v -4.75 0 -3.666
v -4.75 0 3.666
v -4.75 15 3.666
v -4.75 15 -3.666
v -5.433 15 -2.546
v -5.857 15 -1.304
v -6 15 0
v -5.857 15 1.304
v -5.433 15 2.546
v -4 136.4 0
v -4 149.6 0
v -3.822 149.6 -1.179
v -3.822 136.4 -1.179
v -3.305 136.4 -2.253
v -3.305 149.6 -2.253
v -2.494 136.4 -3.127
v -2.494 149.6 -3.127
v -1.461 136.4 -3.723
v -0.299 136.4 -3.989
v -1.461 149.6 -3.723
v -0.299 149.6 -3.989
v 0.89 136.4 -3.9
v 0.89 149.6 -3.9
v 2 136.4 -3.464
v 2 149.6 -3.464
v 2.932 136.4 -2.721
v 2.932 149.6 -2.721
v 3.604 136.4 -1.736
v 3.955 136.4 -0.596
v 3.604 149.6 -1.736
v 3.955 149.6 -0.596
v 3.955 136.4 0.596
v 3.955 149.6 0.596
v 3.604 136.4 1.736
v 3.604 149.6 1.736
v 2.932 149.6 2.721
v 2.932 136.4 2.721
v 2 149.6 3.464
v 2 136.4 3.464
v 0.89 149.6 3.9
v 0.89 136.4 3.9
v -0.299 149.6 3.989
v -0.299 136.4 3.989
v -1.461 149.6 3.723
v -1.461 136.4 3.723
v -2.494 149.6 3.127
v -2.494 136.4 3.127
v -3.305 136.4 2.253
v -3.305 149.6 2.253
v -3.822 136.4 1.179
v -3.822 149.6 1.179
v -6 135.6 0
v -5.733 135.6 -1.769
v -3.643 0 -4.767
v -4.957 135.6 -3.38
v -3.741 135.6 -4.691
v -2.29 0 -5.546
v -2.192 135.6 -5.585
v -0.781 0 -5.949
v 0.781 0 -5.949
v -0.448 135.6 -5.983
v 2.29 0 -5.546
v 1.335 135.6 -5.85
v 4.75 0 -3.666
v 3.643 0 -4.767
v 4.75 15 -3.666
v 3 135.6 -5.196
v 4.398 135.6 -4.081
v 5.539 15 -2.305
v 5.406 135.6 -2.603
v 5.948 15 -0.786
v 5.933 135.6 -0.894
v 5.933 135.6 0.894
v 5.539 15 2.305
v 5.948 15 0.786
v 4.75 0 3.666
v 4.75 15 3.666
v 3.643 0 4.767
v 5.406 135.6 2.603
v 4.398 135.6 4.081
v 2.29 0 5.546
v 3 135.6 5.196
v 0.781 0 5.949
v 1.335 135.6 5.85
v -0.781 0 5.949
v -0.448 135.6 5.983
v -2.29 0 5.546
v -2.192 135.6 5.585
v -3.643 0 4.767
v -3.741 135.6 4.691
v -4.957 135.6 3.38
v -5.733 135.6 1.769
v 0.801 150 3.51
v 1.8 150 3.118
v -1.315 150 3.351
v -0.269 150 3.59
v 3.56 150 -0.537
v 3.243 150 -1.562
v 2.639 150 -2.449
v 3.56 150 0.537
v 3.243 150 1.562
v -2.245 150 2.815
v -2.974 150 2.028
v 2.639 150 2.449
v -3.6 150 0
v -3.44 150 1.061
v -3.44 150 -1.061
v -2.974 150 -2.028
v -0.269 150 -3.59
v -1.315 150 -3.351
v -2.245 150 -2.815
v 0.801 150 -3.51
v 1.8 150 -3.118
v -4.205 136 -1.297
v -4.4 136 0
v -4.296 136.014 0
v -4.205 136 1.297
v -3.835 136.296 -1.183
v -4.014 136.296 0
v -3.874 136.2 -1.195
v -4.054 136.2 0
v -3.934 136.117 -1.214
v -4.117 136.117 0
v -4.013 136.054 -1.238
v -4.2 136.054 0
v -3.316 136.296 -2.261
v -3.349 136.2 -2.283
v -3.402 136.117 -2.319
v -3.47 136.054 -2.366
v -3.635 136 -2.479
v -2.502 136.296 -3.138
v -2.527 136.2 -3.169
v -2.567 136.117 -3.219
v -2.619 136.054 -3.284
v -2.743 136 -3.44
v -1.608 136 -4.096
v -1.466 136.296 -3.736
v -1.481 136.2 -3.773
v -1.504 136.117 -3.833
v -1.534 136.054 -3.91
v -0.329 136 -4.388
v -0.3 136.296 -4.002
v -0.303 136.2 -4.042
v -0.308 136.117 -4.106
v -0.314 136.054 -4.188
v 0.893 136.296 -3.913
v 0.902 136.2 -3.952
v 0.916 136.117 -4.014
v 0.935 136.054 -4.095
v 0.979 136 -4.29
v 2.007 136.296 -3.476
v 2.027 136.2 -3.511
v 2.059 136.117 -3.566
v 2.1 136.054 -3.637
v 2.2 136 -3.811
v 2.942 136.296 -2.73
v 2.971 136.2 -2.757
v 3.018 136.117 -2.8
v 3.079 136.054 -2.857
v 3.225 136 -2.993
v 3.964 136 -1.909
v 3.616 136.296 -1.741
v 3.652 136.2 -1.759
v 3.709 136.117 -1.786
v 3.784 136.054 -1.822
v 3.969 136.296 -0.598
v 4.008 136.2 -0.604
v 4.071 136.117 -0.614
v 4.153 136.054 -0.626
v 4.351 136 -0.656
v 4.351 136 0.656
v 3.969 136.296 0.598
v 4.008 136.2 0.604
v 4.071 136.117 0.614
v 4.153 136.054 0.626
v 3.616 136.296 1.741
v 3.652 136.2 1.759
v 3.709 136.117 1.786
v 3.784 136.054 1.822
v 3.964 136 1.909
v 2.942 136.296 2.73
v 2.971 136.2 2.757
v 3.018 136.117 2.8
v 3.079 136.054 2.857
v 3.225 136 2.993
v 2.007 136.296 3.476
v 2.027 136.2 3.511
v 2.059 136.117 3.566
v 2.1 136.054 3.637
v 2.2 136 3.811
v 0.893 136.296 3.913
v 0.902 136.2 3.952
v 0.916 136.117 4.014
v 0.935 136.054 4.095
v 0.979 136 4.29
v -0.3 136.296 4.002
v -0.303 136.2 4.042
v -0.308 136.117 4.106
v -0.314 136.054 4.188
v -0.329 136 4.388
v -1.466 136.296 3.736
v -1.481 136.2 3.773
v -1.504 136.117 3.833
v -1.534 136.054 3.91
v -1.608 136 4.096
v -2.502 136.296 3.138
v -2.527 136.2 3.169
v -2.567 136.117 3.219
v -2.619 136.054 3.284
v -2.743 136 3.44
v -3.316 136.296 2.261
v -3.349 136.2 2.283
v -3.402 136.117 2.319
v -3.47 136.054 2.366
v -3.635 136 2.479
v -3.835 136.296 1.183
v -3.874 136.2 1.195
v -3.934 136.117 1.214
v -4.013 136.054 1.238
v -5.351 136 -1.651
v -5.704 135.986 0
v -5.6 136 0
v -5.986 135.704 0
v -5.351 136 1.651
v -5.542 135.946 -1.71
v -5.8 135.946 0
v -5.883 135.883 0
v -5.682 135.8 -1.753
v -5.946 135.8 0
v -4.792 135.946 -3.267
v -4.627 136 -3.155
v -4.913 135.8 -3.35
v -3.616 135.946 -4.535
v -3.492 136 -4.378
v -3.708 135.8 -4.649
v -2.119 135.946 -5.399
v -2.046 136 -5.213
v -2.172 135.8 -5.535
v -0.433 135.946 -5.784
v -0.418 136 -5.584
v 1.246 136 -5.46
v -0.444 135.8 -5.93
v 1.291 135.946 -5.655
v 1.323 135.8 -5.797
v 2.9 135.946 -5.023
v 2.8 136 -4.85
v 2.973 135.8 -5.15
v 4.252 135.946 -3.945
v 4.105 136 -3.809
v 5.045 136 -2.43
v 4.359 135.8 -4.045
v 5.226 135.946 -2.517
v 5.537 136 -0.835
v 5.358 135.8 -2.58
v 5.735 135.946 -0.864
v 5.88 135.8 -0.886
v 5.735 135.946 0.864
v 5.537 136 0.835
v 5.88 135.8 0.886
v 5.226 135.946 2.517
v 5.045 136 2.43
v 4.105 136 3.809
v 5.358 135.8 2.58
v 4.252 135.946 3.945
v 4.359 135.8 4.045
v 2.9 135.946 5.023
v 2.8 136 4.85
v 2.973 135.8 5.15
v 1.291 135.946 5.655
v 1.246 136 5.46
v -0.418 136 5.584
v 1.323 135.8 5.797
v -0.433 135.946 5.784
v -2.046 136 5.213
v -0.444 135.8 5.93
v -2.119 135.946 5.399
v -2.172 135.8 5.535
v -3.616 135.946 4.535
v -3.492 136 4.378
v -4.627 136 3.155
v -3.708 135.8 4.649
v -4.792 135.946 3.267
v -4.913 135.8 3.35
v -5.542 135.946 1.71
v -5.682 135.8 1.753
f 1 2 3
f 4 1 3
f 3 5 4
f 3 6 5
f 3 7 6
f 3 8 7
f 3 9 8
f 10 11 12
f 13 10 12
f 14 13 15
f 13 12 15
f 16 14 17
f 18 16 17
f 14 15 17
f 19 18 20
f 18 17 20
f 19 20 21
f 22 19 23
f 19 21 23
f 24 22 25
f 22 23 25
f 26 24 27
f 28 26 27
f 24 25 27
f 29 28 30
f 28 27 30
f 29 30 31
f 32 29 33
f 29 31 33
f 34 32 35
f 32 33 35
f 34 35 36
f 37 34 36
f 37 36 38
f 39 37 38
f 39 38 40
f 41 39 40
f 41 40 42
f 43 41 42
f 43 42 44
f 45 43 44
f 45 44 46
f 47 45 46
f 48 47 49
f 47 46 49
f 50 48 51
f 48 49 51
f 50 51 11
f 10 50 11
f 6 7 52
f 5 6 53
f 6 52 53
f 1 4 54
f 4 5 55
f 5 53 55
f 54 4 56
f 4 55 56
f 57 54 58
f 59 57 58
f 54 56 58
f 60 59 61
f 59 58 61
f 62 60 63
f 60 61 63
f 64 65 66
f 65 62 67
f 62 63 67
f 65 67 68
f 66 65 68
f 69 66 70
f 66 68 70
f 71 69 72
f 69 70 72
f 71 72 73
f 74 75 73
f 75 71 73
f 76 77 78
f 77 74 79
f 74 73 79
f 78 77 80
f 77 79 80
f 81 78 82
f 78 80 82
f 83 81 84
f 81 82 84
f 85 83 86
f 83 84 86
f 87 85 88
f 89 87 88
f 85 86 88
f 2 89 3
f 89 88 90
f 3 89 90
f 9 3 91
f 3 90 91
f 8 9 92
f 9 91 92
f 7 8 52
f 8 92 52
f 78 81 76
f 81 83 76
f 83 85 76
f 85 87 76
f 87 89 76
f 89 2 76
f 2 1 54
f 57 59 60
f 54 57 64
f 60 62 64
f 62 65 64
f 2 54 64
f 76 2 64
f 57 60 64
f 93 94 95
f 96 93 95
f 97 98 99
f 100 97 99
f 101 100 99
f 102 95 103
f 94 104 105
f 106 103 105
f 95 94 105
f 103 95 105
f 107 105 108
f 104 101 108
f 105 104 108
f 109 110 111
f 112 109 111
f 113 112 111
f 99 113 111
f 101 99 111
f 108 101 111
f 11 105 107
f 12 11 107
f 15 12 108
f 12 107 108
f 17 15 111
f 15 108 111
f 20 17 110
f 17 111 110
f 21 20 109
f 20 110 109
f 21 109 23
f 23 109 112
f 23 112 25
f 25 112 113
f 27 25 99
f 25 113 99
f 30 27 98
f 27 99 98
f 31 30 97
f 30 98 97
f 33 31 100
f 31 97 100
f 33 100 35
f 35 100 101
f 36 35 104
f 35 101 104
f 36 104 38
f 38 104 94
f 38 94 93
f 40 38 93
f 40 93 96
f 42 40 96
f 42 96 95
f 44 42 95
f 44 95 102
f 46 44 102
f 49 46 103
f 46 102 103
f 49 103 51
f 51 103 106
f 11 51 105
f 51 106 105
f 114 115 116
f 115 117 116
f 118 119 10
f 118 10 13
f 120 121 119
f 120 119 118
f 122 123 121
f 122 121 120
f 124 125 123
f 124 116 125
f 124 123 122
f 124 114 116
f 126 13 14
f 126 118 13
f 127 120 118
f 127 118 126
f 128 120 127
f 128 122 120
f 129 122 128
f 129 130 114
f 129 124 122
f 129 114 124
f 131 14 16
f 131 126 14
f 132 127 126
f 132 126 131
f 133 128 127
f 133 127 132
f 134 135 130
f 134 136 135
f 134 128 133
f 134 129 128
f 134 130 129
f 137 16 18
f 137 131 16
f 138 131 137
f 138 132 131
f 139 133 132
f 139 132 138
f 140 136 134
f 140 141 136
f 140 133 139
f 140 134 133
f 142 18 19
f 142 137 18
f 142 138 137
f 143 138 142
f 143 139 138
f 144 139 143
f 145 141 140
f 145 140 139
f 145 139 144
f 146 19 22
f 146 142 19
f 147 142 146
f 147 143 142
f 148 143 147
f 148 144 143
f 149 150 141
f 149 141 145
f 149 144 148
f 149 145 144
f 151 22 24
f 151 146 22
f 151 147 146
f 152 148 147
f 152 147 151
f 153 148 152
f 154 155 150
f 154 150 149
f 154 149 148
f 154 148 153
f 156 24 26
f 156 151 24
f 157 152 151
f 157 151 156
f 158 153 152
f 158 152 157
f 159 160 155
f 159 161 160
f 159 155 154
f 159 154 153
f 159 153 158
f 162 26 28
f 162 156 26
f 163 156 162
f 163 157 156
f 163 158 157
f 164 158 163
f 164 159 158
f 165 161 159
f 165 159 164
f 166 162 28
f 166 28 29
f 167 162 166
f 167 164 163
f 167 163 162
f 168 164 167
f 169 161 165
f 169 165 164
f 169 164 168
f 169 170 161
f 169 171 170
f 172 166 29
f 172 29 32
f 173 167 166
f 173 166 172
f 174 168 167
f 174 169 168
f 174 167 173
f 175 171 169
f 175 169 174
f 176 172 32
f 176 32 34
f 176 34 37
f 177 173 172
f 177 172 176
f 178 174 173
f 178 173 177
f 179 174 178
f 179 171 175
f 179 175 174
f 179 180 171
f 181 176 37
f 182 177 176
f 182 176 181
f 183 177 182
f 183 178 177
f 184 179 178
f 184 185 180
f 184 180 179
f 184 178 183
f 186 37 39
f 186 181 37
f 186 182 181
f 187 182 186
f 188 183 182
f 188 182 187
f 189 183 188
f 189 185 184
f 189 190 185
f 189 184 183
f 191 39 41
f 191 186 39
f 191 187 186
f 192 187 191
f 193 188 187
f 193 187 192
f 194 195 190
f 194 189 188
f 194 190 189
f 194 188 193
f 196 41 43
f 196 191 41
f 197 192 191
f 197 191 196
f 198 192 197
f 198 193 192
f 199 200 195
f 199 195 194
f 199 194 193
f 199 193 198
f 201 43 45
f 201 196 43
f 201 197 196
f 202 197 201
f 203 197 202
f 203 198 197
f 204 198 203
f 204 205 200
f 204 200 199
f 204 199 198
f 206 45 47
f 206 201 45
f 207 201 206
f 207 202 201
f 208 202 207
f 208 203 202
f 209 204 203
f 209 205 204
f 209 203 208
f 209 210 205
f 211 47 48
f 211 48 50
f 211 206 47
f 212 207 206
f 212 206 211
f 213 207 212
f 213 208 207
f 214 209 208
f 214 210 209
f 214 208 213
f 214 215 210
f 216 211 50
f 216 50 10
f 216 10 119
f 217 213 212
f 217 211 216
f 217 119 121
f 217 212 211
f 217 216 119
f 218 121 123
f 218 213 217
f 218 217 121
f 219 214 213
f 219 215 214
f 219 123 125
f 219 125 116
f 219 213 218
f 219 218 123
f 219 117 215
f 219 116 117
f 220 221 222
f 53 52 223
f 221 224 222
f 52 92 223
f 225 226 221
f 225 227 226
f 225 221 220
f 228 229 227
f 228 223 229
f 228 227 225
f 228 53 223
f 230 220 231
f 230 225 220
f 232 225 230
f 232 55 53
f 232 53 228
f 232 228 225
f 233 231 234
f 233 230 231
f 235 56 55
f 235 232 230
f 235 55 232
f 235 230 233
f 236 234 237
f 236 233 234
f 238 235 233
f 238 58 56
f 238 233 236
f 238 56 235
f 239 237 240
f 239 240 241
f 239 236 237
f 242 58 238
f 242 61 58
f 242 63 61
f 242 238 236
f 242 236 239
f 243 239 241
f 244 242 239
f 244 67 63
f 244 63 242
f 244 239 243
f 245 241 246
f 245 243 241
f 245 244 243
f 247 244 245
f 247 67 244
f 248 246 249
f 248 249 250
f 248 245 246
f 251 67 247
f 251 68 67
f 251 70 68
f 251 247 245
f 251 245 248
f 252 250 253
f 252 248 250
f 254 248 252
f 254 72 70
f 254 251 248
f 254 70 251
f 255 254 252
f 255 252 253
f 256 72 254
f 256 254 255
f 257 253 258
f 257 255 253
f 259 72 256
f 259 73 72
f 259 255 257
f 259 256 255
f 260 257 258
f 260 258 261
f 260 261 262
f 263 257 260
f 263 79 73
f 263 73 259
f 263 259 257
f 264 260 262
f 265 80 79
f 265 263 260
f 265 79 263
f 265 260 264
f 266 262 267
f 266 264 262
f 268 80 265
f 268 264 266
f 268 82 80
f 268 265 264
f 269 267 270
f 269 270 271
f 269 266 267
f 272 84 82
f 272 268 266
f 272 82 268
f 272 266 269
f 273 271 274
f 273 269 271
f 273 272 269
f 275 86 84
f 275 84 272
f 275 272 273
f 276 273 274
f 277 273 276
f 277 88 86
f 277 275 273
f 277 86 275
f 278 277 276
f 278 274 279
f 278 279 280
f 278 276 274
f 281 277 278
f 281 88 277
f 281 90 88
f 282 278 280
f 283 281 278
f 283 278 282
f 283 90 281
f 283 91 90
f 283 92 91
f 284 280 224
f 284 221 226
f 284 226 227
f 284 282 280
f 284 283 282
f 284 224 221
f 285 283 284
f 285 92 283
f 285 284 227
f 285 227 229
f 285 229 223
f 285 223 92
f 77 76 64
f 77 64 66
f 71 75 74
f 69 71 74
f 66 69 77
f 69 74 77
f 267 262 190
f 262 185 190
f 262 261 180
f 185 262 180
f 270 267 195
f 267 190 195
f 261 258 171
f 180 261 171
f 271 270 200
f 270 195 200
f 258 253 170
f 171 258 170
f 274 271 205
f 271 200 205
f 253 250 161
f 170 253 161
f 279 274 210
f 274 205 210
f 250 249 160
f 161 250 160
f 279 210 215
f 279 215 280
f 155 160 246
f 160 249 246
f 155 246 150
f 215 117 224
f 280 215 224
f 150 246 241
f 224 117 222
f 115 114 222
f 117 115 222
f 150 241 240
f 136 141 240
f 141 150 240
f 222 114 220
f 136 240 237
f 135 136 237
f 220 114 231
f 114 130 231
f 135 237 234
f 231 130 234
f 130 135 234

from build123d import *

# Parameters (mm, degrees)
SKETCH2_W          = 2.5
SKETCH2_H          = 15
CUT_EXTRUDE1_DEPTH = 15
CHAMFER1_SIZE      = 0.4
FILLET1_R          = 0.4


with BuildPart() as part:
    # Sketch1 → Revolve1 (revolve)
    with BuildSketch(Plane.XY):
        Polygon((0, 0), (-6, 0), (-6, 136), (-4, 136), (-4, 150), (0, 150), align=None)
    revolve(axis=Axis((0, 150, 0), (0, -1, 0)))

    # Sketch2 → Cut-Extrude1 (cut, symmetric)
    with BuildSketch(Plane.XY):
        with Locations((-6, 7.5)):
            Rectangle(SKETCH2_W, SKETCH2_H)
    cut_extrude1 = extrude(amount=CUT_EXTRUDE1_DEPTH, both=True, mode=Mode.SUBTRACT)

    # Mirror1: Cut-Extrude1 across plane
    add(cut_extrude1.mirror(Plane(origin=(0, 0, 0), x_dir=(0, 0, 1), z_dir=(1, 0, 0))), mode=Mode.SUBTRACT)

    # Chamfer1
    chamfer1_edges = [part.edges().sort_by_distance(p)[0] for p in [
        (4, 150, 0),
    ]]
    chamfer(chamfer1_edges, length=CHAMFER1_SIZE)

    # Fillet1
    fillet1_edges = [part.edges().sort_by_distance(p)[0] for p in [
        (4, 136, 0),
        (6, 136, 0),
    ]]
    fillet(fillet1_edges, radius=FILLET1_R)


solid = part.part
